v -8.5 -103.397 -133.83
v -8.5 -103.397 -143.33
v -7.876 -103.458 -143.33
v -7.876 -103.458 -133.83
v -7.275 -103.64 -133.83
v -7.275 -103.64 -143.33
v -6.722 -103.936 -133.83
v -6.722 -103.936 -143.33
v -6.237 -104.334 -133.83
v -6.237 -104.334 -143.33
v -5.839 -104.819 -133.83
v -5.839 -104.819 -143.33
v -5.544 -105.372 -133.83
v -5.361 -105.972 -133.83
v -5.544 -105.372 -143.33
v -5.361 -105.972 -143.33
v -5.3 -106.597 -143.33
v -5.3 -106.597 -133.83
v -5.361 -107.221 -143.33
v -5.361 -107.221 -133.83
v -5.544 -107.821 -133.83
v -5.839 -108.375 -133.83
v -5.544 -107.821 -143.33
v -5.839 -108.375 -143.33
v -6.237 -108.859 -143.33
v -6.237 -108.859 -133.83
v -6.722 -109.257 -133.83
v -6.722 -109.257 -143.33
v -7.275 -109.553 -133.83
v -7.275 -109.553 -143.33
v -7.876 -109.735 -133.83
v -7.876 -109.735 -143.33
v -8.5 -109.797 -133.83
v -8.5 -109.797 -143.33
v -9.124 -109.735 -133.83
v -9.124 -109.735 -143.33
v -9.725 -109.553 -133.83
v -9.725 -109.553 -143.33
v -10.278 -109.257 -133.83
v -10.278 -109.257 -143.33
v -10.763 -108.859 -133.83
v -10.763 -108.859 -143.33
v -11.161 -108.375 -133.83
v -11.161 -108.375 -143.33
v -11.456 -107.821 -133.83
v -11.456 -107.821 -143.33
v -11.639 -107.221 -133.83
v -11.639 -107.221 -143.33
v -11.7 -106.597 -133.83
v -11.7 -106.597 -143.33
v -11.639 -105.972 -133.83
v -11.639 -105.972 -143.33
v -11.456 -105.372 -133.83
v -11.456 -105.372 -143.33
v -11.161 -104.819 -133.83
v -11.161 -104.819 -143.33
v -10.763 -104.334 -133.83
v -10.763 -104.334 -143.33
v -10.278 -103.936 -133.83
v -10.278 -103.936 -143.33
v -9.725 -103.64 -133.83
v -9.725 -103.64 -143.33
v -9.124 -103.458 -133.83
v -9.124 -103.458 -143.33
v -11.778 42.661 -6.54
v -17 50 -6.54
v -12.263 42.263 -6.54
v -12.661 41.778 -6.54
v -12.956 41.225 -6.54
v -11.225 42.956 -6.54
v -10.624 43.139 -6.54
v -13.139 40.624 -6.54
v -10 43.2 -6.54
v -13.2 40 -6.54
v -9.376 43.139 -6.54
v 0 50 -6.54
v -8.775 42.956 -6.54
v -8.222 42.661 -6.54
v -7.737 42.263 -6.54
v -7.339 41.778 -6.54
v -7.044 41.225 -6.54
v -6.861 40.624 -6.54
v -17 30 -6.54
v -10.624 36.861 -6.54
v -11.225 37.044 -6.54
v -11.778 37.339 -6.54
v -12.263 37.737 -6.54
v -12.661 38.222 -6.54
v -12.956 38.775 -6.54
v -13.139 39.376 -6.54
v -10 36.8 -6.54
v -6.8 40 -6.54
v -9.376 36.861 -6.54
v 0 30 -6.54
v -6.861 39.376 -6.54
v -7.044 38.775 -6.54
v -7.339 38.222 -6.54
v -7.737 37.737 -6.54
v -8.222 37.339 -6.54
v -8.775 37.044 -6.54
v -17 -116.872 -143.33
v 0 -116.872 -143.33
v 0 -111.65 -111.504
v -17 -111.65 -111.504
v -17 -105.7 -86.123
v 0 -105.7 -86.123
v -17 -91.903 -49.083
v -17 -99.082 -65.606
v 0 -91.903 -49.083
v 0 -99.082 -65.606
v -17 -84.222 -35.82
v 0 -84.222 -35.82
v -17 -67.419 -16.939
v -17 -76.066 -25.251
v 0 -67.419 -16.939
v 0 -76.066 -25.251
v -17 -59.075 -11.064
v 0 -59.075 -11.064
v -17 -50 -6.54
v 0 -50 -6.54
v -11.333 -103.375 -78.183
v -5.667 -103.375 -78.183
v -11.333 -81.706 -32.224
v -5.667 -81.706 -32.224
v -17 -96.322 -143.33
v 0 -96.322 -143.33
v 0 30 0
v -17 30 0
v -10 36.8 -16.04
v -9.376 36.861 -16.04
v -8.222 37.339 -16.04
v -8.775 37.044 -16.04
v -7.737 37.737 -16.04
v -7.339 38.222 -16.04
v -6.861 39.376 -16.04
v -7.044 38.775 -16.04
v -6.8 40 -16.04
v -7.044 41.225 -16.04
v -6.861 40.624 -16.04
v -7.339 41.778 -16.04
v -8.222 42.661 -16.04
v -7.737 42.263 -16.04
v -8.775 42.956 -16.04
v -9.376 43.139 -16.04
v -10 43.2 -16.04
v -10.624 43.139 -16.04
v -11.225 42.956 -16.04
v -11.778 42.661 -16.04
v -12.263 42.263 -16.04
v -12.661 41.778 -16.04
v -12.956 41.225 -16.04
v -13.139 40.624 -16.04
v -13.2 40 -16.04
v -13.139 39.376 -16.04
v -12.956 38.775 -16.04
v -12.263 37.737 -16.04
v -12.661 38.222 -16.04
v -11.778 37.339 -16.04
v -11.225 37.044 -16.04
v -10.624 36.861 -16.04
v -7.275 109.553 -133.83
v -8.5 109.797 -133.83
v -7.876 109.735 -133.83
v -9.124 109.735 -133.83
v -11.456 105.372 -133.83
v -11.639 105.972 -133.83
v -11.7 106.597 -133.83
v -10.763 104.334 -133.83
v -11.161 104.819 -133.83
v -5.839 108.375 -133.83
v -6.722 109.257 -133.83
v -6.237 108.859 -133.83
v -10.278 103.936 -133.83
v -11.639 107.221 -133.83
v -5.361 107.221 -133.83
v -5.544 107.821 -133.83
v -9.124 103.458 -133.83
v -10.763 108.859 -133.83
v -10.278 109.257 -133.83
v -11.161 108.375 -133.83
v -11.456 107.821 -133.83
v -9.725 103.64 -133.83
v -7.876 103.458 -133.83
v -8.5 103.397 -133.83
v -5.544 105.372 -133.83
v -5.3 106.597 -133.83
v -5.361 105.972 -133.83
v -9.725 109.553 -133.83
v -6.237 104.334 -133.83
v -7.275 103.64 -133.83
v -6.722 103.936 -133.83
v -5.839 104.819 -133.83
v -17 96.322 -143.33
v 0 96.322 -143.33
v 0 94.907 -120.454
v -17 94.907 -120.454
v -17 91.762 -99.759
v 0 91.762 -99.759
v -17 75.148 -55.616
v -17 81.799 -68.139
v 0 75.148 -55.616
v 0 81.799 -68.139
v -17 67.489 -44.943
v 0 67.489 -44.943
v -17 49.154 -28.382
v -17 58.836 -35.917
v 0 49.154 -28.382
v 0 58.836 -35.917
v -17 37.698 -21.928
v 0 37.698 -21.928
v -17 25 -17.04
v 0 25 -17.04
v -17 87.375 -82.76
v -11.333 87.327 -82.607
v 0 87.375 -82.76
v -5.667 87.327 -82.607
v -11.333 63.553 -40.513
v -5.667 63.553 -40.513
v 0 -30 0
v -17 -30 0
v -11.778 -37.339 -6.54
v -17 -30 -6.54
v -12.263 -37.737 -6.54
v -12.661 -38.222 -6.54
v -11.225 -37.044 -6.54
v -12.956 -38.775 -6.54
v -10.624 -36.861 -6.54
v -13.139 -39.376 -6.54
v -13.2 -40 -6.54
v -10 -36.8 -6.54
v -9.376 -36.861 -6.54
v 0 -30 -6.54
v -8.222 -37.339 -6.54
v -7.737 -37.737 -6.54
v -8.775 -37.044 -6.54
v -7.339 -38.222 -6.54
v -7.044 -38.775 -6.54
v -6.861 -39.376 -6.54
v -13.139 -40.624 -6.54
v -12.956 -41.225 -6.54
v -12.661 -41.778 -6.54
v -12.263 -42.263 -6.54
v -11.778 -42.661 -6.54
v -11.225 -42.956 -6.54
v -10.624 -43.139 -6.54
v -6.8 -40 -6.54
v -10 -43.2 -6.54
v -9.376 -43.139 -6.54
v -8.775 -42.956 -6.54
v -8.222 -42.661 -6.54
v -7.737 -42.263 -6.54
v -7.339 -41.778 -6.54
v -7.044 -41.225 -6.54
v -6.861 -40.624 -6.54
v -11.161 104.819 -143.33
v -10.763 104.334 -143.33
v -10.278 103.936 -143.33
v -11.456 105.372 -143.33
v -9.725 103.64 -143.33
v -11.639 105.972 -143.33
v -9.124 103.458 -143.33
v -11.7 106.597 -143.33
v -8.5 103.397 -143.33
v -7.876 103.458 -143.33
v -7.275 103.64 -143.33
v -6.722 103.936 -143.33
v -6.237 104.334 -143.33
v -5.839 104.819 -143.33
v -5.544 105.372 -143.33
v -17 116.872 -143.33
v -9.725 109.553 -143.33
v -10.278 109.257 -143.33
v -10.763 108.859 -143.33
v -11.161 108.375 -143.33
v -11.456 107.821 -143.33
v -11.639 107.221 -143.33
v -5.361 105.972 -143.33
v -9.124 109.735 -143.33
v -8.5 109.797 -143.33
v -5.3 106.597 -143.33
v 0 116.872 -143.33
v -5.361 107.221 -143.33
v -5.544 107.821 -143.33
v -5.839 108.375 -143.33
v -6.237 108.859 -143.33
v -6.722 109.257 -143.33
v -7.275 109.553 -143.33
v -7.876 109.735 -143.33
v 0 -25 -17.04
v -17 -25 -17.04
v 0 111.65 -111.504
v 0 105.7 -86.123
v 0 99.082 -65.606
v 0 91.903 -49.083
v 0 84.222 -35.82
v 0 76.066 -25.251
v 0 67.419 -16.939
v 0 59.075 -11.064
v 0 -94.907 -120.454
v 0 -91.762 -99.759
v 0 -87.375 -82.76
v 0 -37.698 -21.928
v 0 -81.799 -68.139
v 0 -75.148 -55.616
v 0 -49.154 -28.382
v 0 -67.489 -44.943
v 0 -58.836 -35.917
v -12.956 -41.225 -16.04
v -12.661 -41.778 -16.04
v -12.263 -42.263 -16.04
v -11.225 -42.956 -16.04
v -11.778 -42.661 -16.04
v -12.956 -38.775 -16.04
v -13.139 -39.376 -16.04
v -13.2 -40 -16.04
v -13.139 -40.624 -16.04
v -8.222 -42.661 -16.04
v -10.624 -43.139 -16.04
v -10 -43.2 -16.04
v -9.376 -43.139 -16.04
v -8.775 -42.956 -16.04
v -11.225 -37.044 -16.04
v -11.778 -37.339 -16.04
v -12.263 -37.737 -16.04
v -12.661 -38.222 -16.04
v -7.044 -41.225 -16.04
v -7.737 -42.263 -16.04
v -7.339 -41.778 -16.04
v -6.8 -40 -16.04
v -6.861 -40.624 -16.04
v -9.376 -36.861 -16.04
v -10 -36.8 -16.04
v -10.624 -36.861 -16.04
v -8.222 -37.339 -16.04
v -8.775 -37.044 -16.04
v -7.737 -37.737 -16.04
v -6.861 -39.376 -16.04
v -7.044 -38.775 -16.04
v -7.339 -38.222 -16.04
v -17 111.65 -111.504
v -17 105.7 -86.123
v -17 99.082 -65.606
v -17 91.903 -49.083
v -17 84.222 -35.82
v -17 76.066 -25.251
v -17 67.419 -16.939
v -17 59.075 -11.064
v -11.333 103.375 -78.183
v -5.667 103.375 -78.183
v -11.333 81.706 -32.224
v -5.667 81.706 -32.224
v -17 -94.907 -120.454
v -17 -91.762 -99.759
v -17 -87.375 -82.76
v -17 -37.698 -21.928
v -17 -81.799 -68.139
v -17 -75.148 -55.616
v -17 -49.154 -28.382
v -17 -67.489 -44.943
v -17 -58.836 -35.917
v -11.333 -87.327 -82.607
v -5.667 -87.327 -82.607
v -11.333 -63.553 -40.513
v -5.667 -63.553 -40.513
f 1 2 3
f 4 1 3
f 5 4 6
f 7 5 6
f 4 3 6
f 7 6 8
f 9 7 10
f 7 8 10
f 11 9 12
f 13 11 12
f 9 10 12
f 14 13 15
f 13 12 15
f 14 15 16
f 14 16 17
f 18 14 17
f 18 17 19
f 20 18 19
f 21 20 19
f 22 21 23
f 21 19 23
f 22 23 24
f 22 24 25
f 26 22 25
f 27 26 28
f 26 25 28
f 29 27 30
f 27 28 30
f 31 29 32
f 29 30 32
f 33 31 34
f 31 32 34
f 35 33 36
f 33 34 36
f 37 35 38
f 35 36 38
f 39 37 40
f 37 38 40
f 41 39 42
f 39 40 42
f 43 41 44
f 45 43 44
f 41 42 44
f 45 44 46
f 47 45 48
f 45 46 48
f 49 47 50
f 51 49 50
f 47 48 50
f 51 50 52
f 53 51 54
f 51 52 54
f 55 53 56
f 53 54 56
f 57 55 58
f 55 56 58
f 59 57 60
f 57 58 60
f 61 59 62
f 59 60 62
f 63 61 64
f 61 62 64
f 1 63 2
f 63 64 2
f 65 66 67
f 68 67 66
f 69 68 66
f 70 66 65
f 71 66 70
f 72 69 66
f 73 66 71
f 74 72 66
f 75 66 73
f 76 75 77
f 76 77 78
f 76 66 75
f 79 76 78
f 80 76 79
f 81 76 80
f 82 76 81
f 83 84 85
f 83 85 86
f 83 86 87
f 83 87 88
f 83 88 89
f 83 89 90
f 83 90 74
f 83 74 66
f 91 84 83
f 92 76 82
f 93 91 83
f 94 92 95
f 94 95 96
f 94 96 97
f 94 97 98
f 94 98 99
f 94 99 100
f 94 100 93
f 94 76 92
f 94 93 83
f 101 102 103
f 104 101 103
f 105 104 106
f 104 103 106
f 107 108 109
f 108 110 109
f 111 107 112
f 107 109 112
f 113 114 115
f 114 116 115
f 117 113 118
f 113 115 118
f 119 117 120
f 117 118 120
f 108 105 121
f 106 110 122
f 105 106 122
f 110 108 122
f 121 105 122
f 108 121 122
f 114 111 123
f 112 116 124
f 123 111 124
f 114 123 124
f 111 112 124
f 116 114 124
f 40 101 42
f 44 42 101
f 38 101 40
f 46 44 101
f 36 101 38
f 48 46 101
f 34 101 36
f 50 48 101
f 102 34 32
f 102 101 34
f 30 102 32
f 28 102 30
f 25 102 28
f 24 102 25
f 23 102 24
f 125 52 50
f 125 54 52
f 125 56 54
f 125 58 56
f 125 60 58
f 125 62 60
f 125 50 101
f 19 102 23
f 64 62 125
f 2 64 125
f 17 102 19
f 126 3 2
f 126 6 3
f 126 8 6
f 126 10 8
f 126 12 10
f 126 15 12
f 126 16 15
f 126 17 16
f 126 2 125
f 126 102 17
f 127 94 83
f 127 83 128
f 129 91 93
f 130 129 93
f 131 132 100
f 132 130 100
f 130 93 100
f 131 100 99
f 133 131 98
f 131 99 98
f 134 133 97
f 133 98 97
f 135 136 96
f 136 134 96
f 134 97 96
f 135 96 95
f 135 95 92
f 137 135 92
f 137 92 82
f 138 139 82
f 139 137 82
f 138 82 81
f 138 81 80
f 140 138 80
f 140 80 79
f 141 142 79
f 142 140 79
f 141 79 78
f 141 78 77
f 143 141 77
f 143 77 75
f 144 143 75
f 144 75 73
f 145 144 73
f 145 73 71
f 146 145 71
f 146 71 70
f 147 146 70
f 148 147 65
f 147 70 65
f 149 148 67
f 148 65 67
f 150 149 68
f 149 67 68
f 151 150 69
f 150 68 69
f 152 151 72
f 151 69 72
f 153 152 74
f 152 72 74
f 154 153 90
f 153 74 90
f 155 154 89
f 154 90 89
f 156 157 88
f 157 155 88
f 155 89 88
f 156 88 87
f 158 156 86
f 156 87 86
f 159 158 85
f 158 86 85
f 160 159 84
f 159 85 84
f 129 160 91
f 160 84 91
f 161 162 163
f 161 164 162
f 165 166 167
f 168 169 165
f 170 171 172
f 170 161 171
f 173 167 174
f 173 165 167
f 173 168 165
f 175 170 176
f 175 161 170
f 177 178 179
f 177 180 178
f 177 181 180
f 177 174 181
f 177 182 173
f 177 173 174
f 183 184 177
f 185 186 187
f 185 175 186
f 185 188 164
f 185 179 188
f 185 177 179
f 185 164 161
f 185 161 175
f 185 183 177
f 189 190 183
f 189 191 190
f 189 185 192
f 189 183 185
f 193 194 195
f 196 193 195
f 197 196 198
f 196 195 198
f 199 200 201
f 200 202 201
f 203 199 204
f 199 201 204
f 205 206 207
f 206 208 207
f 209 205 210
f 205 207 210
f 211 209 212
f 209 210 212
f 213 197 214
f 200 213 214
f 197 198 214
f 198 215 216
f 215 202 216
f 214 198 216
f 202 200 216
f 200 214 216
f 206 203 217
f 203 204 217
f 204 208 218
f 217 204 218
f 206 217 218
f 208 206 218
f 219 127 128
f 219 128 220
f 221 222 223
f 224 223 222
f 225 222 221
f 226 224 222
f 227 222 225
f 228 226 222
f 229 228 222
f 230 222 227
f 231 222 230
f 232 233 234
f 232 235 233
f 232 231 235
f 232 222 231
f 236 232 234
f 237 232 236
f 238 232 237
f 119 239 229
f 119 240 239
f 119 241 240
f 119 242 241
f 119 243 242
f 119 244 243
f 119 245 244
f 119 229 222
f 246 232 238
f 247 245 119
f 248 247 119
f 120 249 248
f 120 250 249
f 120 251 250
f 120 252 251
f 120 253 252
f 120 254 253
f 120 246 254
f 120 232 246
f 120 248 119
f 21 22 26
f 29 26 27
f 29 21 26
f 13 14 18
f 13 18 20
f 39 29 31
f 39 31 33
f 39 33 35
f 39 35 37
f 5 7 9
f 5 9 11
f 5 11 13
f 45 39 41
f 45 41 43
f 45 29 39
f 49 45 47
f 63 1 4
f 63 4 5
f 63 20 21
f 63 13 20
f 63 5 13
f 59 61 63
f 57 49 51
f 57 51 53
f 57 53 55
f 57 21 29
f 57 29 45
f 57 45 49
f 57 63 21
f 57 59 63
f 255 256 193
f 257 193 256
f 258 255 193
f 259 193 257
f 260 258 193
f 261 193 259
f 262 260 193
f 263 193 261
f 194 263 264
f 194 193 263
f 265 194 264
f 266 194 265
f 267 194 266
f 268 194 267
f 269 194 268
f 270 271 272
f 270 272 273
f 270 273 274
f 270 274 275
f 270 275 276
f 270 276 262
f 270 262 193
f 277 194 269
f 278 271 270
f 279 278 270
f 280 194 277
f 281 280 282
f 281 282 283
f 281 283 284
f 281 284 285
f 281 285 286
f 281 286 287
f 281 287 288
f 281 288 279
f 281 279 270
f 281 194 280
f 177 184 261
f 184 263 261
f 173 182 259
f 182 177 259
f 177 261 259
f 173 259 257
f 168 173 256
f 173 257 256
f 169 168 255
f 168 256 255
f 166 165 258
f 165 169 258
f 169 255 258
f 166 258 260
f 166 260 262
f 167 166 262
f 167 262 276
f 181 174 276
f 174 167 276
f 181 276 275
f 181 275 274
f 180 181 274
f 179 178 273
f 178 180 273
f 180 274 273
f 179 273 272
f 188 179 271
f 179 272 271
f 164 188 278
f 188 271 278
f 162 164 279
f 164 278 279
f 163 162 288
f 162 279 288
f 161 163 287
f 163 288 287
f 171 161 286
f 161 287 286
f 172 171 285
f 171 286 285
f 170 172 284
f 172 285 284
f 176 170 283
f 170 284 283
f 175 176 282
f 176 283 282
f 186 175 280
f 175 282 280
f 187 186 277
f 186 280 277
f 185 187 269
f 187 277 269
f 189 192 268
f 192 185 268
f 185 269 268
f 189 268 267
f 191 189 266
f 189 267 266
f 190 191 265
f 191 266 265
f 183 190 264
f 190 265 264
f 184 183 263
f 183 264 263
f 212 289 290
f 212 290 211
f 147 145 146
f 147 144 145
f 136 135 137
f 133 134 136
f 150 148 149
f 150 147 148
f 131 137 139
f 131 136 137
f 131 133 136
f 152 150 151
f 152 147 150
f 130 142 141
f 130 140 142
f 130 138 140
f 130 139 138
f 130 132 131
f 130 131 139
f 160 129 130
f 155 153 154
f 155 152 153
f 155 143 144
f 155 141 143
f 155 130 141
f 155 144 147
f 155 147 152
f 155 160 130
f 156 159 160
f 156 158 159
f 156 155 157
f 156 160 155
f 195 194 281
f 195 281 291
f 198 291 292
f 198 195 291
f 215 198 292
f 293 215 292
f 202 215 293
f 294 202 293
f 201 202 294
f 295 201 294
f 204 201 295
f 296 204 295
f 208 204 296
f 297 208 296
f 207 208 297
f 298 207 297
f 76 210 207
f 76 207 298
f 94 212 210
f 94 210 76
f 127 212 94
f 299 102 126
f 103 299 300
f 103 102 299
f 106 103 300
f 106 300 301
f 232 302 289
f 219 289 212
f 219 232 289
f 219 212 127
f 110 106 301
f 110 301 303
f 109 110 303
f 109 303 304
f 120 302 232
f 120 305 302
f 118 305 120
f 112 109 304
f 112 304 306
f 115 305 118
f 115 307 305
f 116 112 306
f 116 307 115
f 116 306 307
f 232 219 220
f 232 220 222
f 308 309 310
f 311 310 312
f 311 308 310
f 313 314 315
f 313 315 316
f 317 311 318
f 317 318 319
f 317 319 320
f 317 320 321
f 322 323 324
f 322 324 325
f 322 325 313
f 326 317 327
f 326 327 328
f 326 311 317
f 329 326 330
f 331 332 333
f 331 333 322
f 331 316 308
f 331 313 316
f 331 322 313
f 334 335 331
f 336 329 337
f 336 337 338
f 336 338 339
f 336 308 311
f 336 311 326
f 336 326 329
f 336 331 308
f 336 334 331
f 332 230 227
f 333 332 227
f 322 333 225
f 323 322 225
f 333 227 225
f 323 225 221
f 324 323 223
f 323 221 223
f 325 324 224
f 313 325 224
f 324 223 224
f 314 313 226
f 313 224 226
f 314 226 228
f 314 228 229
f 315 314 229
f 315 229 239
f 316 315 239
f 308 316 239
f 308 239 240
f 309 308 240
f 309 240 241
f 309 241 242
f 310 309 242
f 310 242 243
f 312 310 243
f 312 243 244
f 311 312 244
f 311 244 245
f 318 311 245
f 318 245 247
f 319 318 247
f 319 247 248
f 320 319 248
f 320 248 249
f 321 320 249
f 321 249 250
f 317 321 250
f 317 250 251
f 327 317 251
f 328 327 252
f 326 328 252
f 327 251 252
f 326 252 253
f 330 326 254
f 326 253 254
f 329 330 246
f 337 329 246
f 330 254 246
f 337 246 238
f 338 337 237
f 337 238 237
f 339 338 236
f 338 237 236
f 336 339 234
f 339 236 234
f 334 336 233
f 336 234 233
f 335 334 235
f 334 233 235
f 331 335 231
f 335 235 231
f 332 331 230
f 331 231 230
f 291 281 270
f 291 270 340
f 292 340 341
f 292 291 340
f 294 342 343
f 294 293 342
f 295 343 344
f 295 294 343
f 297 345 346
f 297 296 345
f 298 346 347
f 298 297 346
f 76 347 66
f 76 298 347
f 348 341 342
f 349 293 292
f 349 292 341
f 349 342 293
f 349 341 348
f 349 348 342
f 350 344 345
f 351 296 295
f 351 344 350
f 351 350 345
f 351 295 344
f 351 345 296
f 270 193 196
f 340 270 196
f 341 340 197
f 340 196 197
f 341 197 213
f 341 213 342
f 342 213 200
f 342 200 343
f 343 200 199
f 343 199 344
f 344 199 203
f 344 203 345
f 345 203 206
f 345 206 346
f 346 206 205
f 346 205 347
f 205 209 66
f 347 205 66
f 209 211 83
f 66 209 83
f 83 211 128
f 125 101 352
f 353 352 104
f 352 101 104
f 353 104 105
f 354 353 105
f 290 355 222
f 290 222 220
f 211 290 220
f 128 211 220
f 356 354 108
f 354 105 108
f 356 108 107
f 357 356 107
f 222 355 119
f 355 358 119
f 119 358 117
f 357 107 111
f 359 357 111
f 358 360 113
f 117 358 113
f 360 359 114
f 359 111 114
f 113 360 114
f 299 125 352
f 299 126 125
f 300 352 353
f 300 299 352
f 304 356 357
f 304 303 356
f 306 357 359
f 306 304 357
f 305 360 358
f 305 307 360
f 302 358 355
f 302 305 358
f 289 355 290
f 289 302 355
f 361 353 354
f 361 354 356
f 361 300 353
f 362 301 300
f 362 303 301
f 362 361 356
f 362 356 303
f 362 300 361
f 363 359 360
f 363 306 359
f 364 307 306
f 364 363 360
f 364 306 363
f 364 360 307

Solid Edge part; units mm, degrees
sketch "Sketch1" plane through (0, 0, 0) normal (1, 0, 0) x (0, 1, 0)
  line L0 (0, 0) -> (-30, 0)
  line L1 (-30, 0) -> (-30, -6.54)
  line L2 (-30, -6.54) -> (-50, -6.54)
  line L3 (-50, -6.54) -> (-50, -17.04)
  line L4 (-50, -17.04) -> (0, -17.04)
  line L5 (0, -17.04) -> (0, 0)
  dimension "D1" = 10.5
  dimension "D2" = 6.54
extrude "Protrusion1" add sketch "Sketch1" against normal blind 17
sketch "Sketch2" plane through (0, -25, -8.52) normal (1, 0, 0) x (0, 1, 0)
  spline S0 degree 3 poles (-71.3219, -134.81) (-69.7161, -64.7704) (-45.9422, -22.6838) (0, -8.52) knots 0 0 0 0 1 1 1 1
  line L0 (-25, 1.98) -> (0, -8.52)
  spline S1 degree 3 poles (-91.8715, -134.81) (-81.8395, -60.4295) (-62.3452, -13.2062) (-25, 1.98) knots 0 0 0 0 1 1 1 1
  line L1 (-91.8715, -134.81) -> (-71.3219, -134.81)
  dimension "D1" = 143.33
extrude "Extrusionsausprägung_2" add sketch "Sketch2" against normal blind 17
sketch "Sketch3" plane through (-8.5, -106.5967, -143.33) normal (0, 0, -1) x (0, 1, 0)
  circle A0 centre (0, 0) radius 3.2
  dimension "D1" = 6.4
extrude "Extrusionsausschnitt_1" cut sketch "Sketch3" against normal blind 9.5
mirror "Mirror1" about plane through (0, 0, 0) normal (0, -1, 0) of "Protrusion1", "Extrusionsausprägung_2", "Extrusionsausschnitt_1"
sketch "Sketch4" plane through (-8.5, -40, -6.54) normal (0, 0, 1) x (0, 1, 0)
  circle A0 centre (0, 1.5) radius 3.2
  dimension "D1" = 10
  dimension "D2" = 10
extrude "Extrusionsausschnitt_2" cut sketch "Sketch4" against normal blind 9.5
mirror "Mirror2" about plane through (0, 0, 0) normal (0, -1, 0) of "Extrusionsausschnitt_2"
properties part number "61" material "Polyacticacid"
